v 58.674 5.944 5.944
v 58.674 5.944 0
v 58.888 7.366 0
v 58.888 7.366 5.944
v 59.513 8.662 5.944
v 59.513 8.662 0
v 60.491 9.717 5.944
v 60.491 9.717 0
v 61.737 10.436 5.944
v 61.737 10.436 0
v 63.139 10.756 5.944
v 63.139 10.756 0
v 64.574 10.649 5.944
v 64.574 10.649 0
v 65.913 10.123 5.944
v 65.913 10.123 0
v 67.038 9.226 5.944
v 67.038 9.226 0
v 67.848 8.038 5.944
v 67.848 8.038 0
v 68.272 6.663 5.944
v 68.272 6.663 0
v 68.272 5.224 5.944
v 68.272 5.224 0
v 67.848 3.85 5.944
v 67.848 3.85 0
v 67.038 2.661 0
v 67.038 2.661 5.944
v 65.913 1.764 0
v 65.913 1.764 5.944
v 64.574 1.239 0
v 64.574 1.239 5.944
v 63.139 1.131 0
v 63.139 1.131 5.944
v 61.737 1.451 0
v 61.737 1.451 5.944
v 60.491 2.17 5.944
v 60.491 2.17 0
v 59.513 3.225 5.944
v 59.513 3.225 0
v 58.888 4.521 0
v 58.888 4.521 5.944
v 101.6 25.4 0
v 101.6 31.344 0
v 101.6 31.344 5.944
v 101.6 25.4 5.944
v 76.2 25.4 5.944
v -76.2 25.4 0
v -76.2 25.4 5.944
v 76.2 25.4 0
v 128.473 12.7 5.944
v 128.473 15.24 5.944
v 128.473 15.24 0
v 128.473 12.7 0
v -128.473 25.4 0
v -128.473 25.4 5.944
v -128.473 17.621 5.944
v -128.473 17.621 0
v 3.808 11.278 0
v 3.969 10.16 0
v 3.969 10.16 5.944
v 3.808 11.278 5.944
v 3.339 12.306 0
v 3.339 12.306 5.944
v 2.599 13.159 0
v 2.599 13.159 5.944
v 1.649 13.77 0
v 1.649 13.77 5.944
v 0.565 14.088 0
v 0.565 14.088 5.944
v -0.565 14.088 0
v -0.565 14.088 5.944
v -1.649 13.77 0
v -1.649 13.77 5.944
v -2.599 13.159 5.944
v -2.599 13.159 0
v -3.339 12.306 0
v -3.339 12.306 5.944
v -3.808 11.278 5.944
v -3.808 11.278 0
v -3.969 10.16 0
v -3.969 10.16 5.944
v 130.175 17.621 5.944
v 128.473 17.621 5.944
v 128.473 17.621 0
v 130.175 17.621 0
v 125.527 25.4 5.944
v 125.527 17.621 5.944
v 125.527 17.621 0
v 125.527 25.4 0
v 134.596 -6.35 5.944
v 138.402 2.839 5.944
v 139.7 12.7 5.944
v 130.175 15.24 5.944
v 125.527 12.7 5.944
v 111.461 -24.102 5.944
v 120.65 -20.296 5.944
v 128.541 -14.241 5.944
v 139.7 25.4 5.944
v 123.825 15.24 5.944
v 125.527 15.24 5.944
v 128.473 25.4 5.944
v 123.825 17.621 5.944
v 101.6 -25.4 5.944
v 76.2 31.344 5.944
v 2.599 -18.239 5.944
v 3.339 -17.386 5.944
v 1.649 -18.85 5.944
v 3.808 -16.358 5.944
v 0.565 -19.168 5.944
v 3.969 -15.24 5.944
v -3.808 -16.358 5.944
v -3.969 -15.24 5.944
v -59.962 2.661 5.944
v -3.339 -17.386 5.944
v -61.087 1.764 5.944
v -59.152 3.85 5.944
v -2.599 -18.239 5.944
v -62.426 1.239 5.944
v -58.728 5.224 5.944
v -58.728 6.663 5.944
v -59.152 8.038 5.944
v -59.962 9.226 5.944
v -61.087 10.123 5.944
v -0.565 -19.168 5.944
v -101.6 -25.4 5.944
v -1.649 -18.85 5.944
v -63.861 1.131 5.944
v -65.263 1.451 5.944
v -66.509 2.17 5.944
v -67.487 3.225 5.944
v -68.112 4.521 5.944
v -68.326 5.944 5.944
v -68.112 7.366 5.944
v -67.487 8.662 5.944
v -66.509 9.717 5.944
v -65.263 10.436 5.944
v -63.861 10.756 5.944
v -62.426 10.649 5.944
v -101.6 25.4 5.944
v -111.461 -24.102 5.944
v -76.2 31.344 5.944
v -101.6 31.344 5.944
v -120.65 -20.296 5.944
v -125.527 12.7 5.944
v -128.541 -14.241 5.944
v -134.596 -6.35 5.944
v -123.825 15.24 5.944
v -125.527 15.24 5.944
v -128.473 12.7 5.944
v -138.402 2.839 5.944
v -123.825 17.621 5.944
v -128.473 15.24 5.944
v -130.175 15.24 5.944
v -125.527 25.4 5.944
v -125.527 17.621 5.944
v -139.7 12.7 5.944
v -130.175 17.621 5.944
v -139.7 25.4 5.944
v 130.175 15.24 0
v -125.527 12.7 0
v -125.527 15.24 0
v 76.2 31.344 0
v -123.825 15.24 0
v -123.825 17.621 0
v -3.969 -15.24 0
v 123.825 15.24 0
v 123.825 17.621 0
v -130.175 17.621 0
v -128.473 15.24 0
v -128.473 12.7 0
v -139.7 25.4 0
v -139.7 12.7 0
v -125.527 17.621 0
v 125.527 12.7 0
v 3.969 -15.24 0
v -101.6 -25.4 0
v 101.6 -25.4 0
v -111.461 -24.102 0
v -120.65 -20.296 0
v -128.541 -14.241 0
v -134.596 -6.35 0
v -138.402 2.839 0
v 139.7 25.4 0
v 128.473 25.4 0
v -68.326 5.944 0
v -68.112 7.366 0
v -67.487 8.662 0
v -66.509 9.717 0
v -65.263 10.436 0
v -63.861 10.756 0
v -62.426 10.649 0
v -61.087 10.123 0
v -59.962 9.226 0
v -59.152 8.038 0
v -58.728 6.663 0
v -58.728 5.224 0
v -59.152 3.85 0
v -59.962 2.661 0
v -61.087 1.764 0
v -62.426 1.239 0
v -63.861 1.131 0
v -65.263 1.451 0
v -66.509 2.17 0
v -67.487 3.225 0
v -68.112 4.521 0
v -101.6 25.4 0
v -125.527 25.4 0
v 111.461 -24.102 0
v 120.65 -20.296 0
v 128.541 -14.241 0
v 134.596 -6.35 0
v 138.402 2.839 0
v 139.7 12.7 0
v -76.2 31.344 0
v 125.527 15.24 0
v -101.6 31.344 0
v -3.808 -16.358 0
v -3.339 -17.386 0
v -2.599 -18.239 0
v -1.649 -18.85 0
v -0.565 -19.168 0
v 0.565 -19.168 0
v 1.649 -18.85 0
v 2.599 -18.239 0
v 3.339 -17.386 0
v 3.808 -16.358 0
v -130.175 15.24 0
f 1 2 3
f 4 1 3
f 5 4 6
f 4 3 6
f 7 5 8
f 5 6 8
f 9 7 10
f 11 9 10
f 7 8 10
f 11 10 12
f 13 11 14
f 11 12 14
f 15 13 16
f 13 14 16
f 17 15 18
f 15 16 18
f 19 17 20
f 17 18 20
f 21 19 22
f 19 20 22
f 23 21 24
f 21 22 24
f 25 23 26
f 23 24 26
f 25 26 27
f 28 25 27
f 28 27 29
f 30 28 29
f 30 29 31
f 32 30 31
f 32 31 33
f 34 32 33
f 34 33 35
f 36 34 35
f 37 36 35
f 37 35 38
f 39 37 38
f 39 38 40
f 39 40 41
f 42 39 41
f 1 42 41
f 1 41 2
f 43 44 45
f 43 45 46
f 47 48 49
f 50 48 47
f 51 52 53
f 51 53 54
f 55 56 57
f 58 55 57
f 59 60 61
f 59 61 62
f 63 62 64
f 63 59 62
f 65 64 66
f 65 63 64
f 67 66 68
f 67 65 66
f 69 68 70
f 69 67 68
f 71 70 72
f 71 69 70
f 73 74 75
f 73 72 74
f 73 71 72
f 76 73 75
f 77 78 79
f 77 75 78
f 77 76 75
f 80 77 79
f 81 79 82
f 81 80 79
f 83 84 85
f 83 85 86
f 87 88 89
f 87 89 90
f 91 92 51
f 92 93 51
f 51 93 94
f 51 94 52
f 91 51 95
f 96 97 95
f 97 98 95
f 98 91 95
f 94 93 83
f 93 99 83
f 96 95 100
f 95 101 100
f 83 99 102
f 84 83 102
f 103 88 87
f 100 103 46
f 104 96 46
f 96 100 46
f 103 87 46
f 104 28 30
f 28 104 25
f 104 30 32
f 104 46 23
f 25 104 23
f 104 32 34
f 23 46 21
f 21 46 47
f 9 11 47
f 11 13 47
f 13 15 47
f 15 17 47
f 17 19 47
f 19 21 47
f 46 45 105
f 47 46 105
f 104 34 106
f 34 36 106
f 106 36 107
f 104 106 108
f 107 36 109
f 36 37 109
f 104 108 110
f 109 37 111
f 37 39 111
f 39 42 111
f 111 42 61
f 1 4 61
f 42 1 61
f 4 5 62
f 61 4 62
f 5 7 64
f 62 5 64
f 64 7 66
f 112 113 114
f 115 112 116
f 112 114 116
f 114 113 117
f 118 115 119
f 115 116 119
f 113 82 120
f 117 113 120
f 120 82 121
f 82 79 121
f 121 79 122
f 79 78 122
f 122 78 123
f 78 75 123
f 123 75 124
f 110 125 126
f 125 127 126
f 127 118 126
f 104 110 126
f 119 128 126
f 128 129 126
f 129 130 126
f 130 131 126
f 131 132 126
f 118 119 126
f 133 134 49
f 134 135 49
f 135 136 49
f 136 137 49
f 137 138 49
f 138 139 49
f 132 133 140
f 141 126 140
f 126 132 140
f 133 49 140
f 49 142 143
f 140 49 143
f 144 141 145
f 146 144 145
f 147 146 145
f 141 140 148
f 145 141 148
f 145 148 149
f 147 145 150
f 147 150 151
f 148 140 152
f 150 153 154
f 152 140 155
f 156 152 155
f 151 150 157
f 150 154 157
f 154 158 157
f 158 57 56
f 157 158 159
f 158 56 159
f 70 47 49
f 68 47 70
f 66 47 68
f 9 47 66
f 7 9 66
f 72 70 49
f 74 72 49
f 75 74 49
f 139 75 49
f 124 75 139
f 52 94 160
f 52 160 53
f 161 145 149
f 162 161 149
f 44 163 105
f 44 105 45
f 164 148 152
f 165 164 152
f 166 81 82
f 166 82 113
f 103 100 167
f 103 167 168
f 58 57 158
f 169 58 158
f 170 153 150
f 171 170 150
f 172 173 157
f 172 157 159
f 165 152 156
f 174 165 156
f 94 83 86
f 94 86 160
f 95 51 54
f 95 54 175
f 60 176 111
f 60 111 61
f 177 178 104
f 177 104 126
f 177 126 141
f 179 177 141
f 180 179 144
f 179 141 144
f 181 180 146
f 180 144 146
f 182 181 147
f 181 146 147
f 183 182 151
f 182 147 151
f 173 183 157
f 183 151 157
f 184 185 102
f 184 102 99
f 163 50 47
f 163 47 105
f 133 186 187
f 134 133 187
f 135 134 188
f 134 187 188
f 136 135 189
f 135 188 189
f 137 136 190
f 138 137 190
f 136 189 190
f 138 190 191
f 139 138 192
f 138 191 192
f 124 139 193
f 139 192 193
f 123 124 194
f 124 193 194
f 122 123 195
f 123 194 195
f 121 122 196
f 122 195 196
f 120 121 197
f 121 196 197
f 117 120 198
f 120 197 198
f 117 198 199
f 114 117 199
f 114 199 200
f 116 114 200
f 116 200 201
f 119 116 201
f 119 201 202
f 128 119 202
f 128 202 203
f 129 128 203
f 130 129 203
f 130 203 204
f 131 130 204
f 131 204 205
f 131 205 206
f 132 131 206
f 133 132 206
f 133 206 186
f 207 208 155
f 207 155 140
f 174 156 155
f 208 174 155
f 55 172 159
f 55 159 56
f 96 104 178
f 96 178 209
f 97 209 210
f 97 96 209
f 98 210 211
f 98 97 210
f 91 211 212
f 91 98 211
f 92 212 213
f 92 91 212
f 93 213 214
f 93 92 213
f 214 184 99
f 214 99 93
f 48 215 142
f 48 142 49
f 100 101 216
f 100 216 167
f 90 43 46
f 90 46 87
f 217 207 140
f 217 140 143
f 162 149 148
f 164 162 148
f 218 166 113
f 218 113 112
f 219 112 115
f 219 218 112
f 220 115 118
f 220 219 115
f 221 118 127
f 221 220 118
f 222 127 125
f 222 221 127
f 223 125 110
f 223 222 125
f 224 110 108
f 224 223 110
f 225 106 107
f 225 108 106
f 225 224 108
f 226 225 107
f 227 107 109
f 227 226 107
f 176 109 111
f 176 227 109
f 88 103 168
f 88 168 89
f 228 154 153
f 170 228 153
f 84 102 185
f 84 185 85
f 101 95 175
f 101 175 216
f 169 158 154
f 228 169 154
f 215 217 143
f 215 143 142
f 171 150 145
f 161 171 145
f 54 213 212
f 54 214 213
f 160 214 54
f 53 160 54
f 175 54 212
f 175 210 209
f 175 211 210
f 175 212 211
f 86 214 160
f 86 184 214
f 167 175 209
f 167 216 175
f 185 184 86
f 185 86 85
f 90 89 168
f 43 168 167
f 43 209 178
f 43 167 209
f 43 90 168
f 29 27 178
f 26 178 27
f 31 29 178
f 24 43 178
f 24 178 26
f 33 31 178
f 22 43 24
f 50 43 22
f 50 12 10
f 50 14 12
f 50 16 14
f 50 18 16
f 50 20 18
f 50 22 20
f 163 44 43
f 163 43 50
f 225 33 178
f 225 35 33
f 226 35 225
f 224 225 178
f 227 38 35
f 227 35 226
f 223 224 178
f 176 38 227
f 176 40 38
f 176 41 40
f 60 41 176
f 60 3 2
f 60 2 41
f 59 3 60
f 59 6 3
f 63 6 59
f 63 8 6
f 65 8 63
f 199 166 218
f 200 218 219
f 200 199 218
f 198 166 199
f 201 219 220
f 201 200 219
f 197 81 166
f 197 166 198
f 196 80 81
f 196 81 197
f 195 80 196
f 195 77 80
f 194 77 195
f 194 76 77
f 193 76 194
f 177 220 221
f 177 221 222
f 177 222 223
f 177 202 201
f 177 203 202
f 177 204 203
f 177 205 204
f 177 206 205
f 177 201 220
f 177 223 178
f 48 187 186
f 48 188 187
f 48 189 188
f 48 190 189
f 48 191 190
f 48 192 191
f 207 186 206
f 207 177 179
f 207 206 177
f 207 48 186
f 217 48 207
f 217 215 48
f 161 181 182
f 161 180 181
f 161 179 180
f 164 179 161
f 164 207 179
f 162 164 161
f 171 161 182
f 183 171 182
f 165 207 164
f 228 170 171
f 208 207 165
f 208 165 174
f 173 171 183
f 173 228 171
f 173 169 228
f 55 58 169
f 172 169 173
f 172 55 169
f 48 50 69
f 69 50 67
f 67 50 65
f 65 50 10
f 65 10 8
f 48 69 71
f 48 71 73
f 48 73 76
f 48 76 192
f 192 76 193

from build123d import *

# Parameters (mm, degrees)
BOSS_EXTRUDE1_DEPTH = 5.9436
CUT_EXTRUDE1_DEPTH  = 6.35
SKETCH3_R           = 4.826
CUT_EXTRUDE2_DEPTH  = 6.9436
CUT_EXTRUDE3_DEPTH  = 6.9436


with BuildPart() as part:
    # Sketch1 → Boss-Extrude1 (new body)
    with BuildSketch(Plane.XY):
        Polygon((-101.6, 25.4), (-101.6, 31.3436), (-76.2, 31.3436), (-76.2, 25.4), (76.2, 25.4), (76.2, 31.3436), (101.6, 31.3436), (101.6, 25.4), (139.7, 25.4), (139.7, -25.4), (-139.7, -25.4), (-139.7, 25.4), align=None)
    extrude(amount=BOSS_EXTRUDE1_DEPTH)

    # Sketch2 → Cut-Extrude1 (cut)
    with BuildSketch(Plane.XY.offset(5.9436)):
        Polygon((-128.4732, 25.4), (-128.4732, 17.62125), (-130.175, 17.62125), (-130.175, 15.24), (-128.4732, 15.24), (-128.4732, 12.7), (-125.5268, 12.7), (-125.5268, 15.24), (-123.825, 15.24), (-123.825, 17.62125), (-125.5268, 17.62125), (-125.5268, 25.4), align=None)
        Polygon((125.5268, 17.62125), (125.5268, 25.4), (128.4732, 25.4), (128.4732, 17.62125), (130.175, 17.62125), (130.175, 15.24), (128.4732, 15.24), (128.4732, 12.7), (125.5268, 12.7), (125.5268, 15.24), (123.825, 15.24), (123.825, 17.62125), align=None)
    extrude(amount=-CUT_EXTRUDE1_DEPTH, mode=Mode.SUBTRACT)

    # Sketch3 → Cut-Extrude2 (cut, through all)
    with BuildSketch(Plane(origin=(0, 0, 0), x_dir=(-1, 0, 0), z_dir=(0, 0, -1))):
        with Locations((-63.5, 5.9436)):
            Circle(SKETCH3_R)
        with Locations((63.5, 5.9436)):
            Circle(SKETCH3_R)
        with BuildLine():
            Line((3.96875, 10.16), (3.96875, -15.24))
            ThreePointArc((3.96875, -15.24), (0, -19.20875), (-3.96875, -15.24))
            Line((-3.96875, -15.24), (-3.96875, 10.16))
            ThreePointArc((-3.96875, 10.16), (0, 14.12875), (3.96875, 10.16))
        make_face()
    extrude(amount=-CUT_EXTRUDE2_DEPTH, mode=Mode.SUBTRACT)

    # Sketch4 → Cut-Extrude3 (cut, through all)
    with BuildSketch(Plane.XY.offset(5.9436)):
        with BuildLine():
            Line((-139.7, 12.7), (-139.7, -25.4))
            Line((-139.7, -25.4), (-101.6, -25.4))
            ThreePointArc((-101.6, -25.4), (-128.540768363, -14.240768363), (-139.7, 12.7))
        make_face()
        with BuildLine():
            Line((139.7, -25.4), (101.6, -25.4))
            ThreePointArc((101.6, -25.4), (128.540768363, -14.240768363), (139.7, 12.7))
            Line((139.7, 12.7), (139.7, -25.4))
        make_face()
    extrude(amount=-CUT_EXTRUDE3_DEPTH, mode=Mode.SUBTRACT)


solid = part.part
